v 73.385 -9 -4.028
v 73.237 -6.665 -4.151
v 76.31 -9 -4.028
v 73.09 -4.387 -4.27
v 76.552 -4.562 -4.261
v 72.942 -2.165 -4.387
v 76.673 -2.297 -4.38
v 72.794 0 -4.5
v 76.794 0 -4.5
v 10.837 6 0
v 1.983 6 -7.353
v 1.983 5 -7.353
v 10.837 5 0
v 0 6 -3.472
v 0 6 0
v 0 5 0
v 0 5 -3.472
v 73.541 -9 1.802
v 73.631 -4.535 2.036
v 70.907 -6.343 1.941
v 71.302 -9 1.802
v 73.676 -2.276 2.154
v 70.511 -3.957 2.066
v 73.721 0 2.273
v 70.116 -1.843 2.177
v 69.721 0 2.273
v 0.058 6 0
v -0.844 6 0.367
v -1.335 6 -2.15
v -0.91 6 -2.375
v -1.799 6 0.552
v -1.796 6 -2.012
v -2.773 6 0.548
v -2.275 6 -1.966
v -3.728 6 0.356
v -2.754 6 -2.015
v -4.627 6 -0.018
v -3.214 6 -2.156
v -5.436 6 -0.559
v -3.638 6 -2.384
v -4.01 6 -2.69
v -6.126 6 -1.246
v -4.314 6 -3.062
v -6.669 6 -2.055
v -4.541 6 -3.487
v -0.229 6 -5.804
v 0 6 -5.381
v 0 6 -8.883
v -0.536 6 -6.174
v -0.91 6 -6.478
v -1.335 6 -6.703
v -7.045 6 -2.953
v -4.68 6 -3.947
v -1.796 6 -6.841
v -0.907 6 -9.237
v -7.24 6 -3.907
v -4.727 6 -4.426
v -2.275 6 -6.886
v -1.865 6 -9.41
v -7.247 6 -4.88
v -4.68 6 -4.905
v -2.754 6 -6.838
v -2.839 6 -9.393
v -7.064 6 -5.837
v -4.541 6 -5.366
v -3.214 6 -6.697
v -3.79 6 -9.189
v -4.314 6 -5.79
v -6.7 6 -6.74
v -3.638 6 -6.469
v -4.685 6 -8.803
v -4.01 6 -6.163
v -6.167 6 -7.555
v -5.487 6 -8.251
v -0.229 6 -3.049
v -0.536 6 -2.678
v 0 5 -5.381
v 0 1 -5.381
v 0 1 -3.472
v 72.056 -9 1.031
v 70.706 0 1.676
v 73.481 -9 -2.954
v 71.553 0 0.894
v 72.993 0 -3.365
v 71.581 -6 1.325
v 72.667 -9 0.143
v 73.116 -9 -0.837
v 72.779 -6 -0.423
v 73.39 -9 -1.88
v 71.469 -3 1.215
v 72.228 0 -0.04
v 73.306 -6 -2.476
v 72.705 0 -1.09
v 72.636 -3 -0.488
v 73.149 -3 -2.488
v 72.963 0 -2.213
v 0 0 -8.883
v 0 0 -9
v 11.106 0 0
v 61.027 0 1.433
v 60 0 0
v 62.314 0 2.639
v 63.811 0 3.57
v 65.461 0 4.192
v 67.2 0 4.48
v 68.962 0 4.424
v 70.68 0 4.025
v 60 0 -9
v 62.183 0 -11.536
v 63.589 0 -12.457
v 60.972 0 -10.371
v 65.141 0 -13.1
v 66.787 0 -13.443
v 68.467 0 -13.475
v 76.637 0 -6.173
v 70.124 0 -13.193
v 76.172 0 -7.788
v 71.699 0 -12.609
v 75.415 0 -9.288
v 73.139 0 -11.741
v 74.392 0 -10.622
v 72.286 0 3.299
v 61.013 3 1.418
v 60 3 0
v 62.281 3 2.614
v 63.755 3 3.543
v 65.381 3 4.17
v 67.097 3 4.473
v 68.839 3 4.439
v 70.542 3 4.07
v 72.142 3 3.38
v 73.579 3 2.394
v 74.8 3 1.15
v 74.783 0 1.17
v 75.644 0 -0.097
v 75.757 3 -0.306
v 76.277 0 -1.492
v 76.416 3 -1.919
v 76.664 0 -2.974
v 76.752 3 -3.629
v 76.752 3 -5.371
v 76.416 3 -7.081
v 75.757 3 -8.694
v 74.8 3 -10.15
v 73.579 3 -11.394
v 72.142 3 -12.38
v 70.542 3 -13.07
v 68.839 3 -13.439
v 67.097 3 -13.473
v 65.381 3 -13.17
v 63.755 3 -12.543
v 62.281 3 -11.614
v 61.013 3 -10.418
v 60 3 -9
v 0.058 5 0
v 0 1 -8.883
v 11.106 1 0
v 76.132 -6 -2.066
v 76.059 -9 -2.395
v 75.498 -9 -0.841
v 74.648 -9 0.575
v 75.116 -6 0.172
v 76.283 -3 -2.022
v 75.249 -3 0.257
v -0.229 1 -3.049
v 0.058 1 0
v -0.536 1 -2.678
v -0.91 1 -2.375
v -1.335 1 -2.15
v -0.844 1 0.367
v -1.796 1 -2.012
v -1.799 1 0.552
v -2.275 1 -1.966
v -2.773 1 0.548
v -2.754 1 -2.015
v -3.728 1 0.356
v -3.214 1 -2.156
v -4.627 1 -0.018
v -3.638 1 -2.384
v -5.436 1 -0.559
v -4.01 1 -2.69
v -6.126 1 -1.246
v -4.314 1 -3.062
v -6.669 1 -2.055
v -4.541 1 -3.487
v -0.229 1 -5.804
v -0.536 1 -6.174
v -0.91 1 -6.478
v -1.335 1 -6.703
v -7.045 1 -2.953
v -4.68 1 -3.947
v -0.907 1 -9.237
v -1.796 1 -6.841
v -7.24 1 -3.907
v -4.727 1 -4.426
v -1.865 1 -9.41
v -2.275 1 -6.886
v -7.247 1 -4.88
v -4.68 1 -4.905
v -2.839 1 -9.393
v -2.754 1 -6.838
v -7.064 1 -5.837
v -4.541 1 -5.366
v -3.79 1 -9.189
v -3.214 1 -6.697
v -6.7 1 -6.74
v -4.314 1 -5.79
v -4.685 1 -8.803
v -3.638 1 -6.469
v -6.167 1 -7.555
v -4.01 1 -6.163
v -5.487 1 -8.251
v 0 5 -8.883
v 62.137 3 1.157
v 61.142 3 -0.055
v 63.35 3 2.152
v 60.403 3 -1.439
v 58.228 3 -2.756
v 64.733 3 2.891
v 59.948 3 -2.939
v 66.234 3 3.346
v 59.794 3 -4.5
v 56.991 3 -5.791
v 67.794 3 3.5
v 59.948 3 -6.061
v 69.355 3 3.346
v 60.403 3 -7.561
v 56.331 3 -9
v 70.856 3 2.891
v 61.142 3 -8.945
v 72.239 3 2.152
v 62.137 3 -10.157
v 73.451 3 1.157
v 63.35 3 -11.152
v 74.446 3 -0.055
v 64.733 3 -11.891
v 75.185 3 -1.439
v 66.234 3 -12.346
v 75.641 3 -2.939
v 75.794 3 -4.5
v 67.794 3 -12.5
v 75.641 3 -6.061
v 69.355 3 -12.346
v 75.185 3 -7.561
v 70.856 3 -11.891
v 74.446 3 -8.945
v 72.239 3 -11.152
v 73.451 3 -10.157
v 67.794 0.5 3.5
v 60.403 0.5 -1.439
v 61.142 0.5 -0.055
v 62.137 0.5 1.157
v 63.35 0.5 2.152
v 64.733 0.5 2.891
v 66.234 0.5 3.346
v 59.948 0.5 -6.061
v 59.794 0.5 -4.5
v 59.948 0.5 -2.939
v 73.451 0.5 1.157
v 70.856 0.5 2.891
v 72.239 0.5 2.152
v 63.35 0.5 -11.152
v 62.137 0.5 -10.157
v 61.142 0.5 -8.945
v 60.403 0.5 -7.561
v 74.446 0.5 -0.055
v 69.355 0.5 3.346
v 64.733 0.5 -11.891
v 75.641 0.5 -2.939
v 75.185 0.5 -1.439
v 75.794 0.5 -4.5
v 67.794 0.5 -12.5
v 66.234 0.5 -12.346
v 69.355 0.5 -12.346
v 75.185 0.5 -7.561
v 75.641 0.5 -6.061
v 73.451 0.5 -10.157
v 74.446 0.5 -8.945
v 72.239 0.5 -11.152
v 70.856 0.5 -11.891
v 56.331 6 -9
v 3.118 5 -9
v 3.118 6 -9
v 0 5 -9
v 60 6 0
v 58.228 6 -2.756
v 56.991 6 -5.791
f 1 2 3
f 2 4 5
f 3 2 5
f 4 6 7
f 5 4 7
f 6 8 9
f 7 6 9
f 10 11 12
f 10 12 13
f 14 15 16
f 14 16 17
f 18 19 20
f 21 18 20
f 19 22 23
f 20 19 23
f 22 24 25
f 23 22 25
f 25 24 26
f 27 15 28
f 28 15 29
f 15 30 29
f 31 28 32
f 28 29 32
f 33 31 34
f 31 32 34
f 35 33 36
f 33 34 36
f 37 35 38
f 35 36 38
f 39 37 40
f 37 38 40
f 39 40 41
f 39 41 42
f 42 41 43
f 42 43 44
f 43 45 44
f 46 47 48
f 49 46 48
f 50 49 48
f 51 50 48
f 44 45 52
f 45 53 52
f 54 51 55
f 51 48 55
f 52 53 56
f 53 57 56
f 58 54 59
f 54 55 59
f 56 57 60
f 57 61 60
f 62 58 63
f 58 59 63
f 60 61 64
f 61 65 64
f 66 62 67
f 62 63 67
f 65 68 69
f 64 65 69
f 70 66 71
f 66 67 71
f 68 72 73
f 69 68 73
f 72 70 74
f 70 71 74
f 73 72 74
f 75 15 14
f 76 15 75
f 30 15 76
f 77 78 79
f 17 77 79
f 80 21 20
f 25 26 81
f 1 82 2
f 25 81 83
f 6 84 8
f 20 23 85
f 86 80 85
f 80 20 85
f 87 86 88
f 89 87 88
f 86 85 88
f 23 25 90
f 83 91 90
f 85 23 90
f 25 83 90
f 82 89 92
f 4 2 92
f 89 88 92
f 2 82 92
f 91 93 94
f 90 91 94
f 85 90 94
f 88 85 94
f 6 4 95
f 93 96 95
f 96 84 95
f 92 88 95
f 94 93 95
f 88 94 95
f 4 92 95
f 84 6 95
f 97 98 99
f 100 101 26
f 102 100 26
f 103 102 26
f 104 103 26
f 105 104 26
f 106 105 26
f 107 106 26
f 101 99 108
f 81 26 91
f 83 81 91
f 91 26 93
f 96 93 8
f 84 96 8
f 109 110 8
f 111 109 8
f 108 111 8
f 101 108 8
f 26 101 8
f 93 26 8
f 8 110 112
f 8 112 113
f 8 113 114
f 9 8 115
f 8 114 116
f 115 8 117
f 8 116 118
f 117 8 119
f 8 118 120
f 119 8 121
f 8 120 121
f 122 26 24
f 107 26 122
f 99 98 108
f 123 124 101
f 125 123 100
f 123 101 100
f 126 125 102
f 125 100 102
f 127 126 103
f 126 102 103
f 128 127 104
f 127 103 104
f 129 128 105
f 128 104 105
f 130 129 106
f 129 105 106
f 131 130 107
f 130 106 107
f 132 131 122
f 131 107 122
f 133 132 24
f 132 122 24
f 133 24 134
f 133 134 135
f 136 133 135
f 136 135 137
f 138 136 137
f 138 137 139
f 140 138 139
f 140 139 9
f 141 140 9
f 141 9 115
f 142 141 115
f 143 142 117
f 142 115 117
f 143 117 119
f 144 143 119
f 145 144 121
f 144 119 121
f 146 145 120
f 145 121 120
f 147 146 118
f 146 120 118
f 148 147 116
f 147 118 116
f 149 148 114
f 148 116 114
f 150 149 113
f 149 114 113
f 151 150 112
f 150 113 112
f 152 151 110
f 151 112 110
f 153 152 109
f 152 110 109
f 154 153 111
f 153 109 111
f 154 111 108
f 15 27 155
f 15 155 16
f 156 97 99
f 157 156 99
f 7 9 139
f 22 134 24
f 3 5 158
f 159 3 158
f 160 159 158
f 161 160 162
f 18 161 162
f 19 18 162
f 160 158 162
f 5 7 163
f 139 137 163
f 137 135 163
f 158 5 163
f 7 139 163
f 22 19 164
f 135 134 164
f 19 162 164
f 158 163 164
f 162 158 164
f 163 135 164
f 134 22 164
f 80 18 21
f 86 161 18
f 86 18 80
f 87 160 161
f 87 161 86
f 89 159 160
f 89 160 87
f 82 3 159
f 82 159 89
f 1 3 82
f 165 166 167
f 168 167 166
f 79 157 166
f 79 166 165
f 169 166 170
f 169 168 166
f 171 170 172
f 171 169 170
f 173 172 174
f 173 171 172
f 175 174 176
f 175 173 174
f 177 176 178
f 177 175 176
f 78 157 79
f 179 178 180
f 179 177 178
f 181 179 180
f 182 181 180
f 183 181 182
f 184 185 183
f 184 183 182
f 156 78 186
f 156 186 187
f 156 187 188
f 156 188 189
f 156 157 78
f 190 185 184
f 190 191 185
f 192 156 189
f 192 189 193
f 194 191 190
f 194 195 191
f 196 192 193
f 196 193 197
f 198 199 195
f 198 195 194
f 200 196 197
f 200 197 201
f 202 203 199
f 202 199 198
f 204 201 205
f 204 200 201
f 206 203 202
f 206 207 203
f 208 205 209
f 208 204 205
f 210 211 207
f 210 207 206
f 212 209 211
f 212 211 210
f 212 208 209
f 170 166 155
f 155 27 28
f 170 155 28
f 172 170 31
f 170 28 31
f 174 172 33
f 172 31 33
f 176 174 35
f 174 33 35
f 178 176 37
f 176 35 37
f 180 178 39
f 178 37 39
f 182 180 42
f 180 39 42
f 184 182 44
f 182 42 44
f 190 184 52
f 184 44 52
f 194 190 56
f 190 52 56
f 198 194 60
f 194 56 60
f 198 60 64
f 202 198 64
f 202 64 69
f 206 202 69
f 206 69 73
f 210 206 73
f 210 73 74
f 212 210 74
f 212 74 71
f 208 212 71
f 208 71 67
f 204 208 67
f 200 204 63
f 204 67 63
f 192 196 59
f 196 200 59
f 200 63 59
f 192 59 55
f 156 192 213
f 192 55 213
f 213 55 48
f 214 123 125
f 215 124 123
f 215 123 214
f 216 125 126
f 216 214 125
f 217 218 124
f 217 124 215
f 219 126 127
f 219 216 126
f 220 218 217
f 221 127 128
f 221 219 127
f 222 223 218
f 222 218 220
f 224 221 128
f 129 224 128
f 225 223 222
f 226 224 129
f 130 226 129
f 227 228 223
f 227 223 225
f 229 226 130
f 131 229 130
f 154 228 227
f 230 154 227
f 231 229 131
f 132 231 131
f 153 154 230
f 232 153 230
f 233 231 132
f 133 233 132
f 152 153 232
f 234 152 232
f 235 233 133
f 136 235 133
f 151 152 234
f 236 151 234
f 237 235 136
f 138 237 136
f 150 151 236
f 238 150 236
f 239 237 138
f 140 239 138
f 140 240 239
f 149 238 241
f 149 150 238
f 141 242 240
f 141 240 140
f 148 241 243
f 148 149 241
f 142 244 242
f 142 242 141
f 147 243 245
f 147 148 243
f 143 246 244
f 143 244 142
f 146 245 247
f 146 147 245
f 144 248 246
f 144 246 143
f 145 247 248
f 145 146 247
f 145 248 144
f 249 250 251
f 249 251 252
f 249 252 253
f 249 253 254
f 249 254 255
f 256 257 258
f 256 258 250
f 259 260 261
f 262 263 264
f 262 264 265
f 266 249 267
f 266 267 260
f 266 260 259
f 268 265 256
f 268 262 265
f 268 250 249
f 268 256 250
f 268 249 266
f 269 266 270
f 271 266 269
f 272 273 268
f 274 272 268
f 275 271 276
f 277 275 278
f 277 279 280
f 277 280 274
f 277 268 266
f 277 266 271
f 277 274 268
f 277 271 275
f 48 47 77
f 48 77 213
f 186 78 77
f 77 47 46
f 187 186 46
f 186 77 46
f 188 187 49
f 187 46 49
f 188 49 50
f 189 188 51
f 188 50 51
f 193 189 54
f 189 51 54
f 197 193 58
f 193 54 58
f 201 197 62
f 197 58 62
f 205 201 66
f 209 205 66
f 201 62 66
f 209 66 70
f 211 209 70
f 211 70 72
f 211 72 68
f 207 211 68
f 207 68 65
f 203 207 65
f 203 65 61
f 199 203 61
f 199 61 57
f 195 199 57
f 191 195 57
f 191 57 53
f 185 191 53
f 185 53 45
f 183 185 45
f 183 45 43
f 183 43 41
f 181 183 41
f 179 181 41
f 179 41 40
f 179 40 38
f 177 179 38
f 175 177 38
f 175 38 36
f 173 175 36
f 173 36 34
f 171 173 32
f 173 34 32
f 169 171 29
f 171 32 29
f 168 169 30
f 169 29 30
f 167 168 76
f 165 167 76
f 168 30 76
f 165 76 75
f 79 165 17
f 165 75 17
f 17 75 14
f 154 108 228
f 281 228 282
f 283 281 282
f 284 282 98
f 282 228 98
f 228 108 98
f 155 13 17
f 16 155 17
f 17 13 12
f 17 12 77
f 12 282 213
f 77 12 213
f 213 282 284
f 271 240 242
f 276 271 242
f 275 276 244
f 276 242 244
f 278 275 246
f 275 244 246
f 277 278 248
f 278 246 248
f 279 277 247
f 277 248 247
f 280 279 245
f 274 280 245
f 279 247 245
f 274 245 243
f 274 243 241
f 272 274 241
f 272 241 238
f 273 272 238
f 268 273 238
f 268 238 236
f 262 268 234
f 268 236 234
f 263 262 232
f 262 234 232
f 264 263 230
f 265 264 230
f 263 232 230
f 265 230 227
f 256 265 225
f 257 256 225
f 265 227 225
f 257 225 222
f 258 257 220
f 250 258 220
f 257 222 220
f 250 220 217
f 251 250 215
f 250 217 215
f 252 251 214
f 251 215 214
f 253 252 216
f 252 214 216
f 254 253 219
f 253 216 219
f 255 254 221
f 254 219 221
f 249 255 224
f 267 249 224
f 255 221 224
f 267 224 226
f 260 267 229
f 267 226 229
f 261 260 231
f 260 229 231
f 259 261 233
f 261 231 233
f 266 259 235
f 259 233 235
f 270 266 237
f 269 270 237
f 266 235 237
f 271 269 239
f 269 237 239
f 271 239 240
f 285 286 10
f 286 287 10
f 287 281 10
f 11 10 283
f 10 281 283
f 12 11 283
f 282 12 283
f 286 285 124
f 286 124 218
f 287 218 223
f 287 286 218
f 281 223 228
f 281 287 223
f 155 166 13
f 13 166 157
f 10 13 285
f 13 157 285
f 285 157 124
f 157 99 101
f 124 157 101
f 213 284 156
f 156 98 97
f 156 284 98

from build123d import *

# Parameters (mm, degrees)
BOSS_EXTRUDE1_DEPTH      = 5.999999938
SKETCH3_R                = 9
CUT_EXTRUDE1_DEPTH       = 3
CUT_EXTRUDE5_DEPTH       = 1
CUT_EXTRUDE5_DEPTH_BACK  = 3
EXTRUDE_THIN3_DEPTH      = 5.999999938
CUT_EXTRUDE9_DEPTH       = 1
CUT_EXTRUDE10_DEPTH      = 1
CUT_EXTRUDE10_DEPTH_BACK = 1
BOSS_EXTRUDE3_DEPTH      = 9
BOSS_EXTRUDE3_DRAFT      = 3
SKETCH14_R               = 8
CUT_EXTRUDE13_DEPTH      = 2.5
CUT_EXTRUDE15_DEPTH      = 10
CUT_EXTRUDE15_DEPTH_BACK = 1.000000032


with BuildPart() as part:
    # Sketch2 → Boss-Extrude1 (new body)
    with BuildSketch(Plane(origin=(0, 0, 0), x_dir=(1, 0, 0), z_dir=(0, 1, 0))):
        with BuildLine():
            Line((0, 0), (60, 0))
            ThreePointArc((60, 0), (76.794228634, 4.5), (60, 9))
            Line((60, 9), (0, 9))
            Line((0, 9), (0, 0))
        make_face()
    extrude(amount=BOSS_EXTRUDE1_DEPTH)

    # Sketch3 → Cut-Extrude1 (cut)
    with BuildSketch(Plane(origin=(0, 5.999999938, 0), x_dir=(1, 0, 0), z_dir=(0, 1, 0))):
        with Locations((67.794228634, 4.5)):
            Circle(SKETCH3_R)
    extrude(amount=-CUT_EXTRUDE1_DEPTH, mode=Mode.SUBTRACT)

    # Sketch5 → Cut-Extrude5 (cut, two sides)
    with BuildSketch(Plane(origin=(0, 5.999999938, 0), x_dir=(1, 0, 0), z_dir=(0, 1, 0))) as cut_extrude5_sk:
        with BuildLine():
            Line((141.885159374, -104.803724525), (60, 0))
            ThreePointArc((60, 0), (57.540129042, 4.245085458), (56.330788983, 9))
            Line((56.330788983, 9), (41.599359793, 141.181636372))
            Line((41.599359793, 141.181636372), (287.915588972, 241.602327681))
            Line((287.915588972, 241.602327681), (388.201388554, -4.383033215))
            Line((388.201388554, -4.383033215), (141.885159374, -104.803724525))
        make_face()
    extrude(amount=CUT_EXTRUDE5_DEPTH, mode=Mode.SUBTRACT)
    extrude(cut_extrude5_sk.sketch, amount=-CUT_EXTRUDE5_DEPTH_BACK, mode=Mode.SUBTRACT)

    # Sketch6 → Extrude-Thin3 (add)
    with BuildSketch(Plane(origin=(0, 5.999999938, 0), x_dir=(1, 0, 0), z_dir=(0, 1, 0))):
        with BuildLine():
            ThreePointArc((2.566768688, 3.148851961), (-7.252946342, 4.805124242), (2.704294257, 4.958097373))
            Line((2.704294257, 4.958097373), (0.178709714, 4.68787022))
            ThreePointArc((0.178709714, 4.68787022), (-4.720252661, 4.61260744), (0.111047134, 3.797721478))
            Line((0.111047134, 3.797721478), (2.566768688, 3.148851961))
        make_face()
    extrude(amount=-EXTRUDE_THIN3_DEPTH)

    # Sketch7 → Cut-Extrude9 (cut)
    with BuildSketch(Plane(origin=(0, 5.999999938, 0), x_dir=(1, 0, 0), z_dir=(0, 1, 0))):
        Polygon((0, 0), (0, 9), (10.83654063, 0), align=None)
    extrude(amount=-CUT_EXTRUDE9_DEPTH, mode=Mode.SUBTRACT)

    # Sketch8 → Cut-Extrude10 (cut, two sides)
    with BuildSketch(Plane(origin=(0, 5.999999938, 0), x_dir=(1, 0, 0), z_dir=(0, 1, 0))) as cut_extrude10_sk:
        Polygon((0, 9), (1.982929041, 7.353131135), (3.117751909, 9), align=None)
    extrude(amount=CUT_EXTRUDE10_DEPTH, mode=Mode.SUBTRACT)
    extrude(cut_extrude10_sk.sketch, amount=-CUT_EXTRUDE10_DEPTH_BACK, mode=Mode.SUBTRACT)


with BuildPart() as boss_extrude3_tool:
    # Sketch9 → Boss-Extrude3 (with draft: the straight prism first)
    with BuildSketch(Plane(origin=(0, 0, 0), x_dir=(-1, 0, 0), z_dir=(0, -1, 0))):
        with BuildLine():
            Line((-73.720761097, -2.273198134), (-69.720761097, -2.273198134))
            ThreePointArc((-69.720761097, -2.273198134), (-72.492846156, 0.552836778), (-72.794228634, 4.5))
            Line((-72.794228634, 4.5), (-76.794228634, 4.5))
            ThreePointArc((-76.794228634, 4.5), (-75.989922386, 0.781048008), (-73.720761097, -2.273198134))
        make_face()
    extrude(amount=BOSS_EXTRUDE3_DEPTH)
    # Boss-Extrude3: the draft: its side faces are tilted about the plane it starts from
    boss_extrude3_sides = [boss_extrude3_tool.faces().sort_by_distance(p)[0] for p in [
        (72.492846156, -4.5, -0.552836778),
        (74.794228634, -4.5, -4.5),
        (75.989922386, -4.5, -0.781048008),
        (71.720761097, -4.5, 2.273198134),
    ]]
    draft(boss_extrude3_sides, Plane(origin=(0, 0, 0), x_dir=(-1, 0, 0), z_dir=(0, -1, 0)), BOSS_EXTRUDE3_DRAFT)


with BuildPart() as part_1:
    add(part.part)

    # Boss-Extrude3: add boss_extrude3_tool
    add(boss_extrude3_tool.part)

    # Sketch14 → Cut-Extrude13 (cut)
    with BuildSketch(Plane(origin=(0, 2.999999938, 0), x_dir=(1, 0, 0), z_dir=(0, 1, 0))):
        with Locations((67.794228634, 4.5)):
            Circle(SKETCH14_R)
    extrude(amount=-CUT_EXTRUDE13_DEPTH, mode=Mode.SUBTRACT)

    # Sketch16 → Cut-Extrude15 (cut, two sides)
    with BuildSketch(Plane(origin=(0, 0, 0), x_dir=(-1, 0, 0), z_dir=(0, -1, 0))) as cut_extrude15_sk:
        Polygon((129.561472715, 112.505246853), (0, 8.882522618), (-11.105987806, 0), (-140.667460521, -103.622724235), (66.57798795, -362.745669665), (336.806921186, -146.617698577), align=None)
    extrude(amount=CUT_EXTRUDE15_DEPTH, mode=Mode.SUBTRACT)
    extrude(cut_extrude15_sk.sketch, amount=-CUT_EXTRUDE15_DEPTH_BACK, mode=Mode.SUBTRACT)


solid = part_1.part
